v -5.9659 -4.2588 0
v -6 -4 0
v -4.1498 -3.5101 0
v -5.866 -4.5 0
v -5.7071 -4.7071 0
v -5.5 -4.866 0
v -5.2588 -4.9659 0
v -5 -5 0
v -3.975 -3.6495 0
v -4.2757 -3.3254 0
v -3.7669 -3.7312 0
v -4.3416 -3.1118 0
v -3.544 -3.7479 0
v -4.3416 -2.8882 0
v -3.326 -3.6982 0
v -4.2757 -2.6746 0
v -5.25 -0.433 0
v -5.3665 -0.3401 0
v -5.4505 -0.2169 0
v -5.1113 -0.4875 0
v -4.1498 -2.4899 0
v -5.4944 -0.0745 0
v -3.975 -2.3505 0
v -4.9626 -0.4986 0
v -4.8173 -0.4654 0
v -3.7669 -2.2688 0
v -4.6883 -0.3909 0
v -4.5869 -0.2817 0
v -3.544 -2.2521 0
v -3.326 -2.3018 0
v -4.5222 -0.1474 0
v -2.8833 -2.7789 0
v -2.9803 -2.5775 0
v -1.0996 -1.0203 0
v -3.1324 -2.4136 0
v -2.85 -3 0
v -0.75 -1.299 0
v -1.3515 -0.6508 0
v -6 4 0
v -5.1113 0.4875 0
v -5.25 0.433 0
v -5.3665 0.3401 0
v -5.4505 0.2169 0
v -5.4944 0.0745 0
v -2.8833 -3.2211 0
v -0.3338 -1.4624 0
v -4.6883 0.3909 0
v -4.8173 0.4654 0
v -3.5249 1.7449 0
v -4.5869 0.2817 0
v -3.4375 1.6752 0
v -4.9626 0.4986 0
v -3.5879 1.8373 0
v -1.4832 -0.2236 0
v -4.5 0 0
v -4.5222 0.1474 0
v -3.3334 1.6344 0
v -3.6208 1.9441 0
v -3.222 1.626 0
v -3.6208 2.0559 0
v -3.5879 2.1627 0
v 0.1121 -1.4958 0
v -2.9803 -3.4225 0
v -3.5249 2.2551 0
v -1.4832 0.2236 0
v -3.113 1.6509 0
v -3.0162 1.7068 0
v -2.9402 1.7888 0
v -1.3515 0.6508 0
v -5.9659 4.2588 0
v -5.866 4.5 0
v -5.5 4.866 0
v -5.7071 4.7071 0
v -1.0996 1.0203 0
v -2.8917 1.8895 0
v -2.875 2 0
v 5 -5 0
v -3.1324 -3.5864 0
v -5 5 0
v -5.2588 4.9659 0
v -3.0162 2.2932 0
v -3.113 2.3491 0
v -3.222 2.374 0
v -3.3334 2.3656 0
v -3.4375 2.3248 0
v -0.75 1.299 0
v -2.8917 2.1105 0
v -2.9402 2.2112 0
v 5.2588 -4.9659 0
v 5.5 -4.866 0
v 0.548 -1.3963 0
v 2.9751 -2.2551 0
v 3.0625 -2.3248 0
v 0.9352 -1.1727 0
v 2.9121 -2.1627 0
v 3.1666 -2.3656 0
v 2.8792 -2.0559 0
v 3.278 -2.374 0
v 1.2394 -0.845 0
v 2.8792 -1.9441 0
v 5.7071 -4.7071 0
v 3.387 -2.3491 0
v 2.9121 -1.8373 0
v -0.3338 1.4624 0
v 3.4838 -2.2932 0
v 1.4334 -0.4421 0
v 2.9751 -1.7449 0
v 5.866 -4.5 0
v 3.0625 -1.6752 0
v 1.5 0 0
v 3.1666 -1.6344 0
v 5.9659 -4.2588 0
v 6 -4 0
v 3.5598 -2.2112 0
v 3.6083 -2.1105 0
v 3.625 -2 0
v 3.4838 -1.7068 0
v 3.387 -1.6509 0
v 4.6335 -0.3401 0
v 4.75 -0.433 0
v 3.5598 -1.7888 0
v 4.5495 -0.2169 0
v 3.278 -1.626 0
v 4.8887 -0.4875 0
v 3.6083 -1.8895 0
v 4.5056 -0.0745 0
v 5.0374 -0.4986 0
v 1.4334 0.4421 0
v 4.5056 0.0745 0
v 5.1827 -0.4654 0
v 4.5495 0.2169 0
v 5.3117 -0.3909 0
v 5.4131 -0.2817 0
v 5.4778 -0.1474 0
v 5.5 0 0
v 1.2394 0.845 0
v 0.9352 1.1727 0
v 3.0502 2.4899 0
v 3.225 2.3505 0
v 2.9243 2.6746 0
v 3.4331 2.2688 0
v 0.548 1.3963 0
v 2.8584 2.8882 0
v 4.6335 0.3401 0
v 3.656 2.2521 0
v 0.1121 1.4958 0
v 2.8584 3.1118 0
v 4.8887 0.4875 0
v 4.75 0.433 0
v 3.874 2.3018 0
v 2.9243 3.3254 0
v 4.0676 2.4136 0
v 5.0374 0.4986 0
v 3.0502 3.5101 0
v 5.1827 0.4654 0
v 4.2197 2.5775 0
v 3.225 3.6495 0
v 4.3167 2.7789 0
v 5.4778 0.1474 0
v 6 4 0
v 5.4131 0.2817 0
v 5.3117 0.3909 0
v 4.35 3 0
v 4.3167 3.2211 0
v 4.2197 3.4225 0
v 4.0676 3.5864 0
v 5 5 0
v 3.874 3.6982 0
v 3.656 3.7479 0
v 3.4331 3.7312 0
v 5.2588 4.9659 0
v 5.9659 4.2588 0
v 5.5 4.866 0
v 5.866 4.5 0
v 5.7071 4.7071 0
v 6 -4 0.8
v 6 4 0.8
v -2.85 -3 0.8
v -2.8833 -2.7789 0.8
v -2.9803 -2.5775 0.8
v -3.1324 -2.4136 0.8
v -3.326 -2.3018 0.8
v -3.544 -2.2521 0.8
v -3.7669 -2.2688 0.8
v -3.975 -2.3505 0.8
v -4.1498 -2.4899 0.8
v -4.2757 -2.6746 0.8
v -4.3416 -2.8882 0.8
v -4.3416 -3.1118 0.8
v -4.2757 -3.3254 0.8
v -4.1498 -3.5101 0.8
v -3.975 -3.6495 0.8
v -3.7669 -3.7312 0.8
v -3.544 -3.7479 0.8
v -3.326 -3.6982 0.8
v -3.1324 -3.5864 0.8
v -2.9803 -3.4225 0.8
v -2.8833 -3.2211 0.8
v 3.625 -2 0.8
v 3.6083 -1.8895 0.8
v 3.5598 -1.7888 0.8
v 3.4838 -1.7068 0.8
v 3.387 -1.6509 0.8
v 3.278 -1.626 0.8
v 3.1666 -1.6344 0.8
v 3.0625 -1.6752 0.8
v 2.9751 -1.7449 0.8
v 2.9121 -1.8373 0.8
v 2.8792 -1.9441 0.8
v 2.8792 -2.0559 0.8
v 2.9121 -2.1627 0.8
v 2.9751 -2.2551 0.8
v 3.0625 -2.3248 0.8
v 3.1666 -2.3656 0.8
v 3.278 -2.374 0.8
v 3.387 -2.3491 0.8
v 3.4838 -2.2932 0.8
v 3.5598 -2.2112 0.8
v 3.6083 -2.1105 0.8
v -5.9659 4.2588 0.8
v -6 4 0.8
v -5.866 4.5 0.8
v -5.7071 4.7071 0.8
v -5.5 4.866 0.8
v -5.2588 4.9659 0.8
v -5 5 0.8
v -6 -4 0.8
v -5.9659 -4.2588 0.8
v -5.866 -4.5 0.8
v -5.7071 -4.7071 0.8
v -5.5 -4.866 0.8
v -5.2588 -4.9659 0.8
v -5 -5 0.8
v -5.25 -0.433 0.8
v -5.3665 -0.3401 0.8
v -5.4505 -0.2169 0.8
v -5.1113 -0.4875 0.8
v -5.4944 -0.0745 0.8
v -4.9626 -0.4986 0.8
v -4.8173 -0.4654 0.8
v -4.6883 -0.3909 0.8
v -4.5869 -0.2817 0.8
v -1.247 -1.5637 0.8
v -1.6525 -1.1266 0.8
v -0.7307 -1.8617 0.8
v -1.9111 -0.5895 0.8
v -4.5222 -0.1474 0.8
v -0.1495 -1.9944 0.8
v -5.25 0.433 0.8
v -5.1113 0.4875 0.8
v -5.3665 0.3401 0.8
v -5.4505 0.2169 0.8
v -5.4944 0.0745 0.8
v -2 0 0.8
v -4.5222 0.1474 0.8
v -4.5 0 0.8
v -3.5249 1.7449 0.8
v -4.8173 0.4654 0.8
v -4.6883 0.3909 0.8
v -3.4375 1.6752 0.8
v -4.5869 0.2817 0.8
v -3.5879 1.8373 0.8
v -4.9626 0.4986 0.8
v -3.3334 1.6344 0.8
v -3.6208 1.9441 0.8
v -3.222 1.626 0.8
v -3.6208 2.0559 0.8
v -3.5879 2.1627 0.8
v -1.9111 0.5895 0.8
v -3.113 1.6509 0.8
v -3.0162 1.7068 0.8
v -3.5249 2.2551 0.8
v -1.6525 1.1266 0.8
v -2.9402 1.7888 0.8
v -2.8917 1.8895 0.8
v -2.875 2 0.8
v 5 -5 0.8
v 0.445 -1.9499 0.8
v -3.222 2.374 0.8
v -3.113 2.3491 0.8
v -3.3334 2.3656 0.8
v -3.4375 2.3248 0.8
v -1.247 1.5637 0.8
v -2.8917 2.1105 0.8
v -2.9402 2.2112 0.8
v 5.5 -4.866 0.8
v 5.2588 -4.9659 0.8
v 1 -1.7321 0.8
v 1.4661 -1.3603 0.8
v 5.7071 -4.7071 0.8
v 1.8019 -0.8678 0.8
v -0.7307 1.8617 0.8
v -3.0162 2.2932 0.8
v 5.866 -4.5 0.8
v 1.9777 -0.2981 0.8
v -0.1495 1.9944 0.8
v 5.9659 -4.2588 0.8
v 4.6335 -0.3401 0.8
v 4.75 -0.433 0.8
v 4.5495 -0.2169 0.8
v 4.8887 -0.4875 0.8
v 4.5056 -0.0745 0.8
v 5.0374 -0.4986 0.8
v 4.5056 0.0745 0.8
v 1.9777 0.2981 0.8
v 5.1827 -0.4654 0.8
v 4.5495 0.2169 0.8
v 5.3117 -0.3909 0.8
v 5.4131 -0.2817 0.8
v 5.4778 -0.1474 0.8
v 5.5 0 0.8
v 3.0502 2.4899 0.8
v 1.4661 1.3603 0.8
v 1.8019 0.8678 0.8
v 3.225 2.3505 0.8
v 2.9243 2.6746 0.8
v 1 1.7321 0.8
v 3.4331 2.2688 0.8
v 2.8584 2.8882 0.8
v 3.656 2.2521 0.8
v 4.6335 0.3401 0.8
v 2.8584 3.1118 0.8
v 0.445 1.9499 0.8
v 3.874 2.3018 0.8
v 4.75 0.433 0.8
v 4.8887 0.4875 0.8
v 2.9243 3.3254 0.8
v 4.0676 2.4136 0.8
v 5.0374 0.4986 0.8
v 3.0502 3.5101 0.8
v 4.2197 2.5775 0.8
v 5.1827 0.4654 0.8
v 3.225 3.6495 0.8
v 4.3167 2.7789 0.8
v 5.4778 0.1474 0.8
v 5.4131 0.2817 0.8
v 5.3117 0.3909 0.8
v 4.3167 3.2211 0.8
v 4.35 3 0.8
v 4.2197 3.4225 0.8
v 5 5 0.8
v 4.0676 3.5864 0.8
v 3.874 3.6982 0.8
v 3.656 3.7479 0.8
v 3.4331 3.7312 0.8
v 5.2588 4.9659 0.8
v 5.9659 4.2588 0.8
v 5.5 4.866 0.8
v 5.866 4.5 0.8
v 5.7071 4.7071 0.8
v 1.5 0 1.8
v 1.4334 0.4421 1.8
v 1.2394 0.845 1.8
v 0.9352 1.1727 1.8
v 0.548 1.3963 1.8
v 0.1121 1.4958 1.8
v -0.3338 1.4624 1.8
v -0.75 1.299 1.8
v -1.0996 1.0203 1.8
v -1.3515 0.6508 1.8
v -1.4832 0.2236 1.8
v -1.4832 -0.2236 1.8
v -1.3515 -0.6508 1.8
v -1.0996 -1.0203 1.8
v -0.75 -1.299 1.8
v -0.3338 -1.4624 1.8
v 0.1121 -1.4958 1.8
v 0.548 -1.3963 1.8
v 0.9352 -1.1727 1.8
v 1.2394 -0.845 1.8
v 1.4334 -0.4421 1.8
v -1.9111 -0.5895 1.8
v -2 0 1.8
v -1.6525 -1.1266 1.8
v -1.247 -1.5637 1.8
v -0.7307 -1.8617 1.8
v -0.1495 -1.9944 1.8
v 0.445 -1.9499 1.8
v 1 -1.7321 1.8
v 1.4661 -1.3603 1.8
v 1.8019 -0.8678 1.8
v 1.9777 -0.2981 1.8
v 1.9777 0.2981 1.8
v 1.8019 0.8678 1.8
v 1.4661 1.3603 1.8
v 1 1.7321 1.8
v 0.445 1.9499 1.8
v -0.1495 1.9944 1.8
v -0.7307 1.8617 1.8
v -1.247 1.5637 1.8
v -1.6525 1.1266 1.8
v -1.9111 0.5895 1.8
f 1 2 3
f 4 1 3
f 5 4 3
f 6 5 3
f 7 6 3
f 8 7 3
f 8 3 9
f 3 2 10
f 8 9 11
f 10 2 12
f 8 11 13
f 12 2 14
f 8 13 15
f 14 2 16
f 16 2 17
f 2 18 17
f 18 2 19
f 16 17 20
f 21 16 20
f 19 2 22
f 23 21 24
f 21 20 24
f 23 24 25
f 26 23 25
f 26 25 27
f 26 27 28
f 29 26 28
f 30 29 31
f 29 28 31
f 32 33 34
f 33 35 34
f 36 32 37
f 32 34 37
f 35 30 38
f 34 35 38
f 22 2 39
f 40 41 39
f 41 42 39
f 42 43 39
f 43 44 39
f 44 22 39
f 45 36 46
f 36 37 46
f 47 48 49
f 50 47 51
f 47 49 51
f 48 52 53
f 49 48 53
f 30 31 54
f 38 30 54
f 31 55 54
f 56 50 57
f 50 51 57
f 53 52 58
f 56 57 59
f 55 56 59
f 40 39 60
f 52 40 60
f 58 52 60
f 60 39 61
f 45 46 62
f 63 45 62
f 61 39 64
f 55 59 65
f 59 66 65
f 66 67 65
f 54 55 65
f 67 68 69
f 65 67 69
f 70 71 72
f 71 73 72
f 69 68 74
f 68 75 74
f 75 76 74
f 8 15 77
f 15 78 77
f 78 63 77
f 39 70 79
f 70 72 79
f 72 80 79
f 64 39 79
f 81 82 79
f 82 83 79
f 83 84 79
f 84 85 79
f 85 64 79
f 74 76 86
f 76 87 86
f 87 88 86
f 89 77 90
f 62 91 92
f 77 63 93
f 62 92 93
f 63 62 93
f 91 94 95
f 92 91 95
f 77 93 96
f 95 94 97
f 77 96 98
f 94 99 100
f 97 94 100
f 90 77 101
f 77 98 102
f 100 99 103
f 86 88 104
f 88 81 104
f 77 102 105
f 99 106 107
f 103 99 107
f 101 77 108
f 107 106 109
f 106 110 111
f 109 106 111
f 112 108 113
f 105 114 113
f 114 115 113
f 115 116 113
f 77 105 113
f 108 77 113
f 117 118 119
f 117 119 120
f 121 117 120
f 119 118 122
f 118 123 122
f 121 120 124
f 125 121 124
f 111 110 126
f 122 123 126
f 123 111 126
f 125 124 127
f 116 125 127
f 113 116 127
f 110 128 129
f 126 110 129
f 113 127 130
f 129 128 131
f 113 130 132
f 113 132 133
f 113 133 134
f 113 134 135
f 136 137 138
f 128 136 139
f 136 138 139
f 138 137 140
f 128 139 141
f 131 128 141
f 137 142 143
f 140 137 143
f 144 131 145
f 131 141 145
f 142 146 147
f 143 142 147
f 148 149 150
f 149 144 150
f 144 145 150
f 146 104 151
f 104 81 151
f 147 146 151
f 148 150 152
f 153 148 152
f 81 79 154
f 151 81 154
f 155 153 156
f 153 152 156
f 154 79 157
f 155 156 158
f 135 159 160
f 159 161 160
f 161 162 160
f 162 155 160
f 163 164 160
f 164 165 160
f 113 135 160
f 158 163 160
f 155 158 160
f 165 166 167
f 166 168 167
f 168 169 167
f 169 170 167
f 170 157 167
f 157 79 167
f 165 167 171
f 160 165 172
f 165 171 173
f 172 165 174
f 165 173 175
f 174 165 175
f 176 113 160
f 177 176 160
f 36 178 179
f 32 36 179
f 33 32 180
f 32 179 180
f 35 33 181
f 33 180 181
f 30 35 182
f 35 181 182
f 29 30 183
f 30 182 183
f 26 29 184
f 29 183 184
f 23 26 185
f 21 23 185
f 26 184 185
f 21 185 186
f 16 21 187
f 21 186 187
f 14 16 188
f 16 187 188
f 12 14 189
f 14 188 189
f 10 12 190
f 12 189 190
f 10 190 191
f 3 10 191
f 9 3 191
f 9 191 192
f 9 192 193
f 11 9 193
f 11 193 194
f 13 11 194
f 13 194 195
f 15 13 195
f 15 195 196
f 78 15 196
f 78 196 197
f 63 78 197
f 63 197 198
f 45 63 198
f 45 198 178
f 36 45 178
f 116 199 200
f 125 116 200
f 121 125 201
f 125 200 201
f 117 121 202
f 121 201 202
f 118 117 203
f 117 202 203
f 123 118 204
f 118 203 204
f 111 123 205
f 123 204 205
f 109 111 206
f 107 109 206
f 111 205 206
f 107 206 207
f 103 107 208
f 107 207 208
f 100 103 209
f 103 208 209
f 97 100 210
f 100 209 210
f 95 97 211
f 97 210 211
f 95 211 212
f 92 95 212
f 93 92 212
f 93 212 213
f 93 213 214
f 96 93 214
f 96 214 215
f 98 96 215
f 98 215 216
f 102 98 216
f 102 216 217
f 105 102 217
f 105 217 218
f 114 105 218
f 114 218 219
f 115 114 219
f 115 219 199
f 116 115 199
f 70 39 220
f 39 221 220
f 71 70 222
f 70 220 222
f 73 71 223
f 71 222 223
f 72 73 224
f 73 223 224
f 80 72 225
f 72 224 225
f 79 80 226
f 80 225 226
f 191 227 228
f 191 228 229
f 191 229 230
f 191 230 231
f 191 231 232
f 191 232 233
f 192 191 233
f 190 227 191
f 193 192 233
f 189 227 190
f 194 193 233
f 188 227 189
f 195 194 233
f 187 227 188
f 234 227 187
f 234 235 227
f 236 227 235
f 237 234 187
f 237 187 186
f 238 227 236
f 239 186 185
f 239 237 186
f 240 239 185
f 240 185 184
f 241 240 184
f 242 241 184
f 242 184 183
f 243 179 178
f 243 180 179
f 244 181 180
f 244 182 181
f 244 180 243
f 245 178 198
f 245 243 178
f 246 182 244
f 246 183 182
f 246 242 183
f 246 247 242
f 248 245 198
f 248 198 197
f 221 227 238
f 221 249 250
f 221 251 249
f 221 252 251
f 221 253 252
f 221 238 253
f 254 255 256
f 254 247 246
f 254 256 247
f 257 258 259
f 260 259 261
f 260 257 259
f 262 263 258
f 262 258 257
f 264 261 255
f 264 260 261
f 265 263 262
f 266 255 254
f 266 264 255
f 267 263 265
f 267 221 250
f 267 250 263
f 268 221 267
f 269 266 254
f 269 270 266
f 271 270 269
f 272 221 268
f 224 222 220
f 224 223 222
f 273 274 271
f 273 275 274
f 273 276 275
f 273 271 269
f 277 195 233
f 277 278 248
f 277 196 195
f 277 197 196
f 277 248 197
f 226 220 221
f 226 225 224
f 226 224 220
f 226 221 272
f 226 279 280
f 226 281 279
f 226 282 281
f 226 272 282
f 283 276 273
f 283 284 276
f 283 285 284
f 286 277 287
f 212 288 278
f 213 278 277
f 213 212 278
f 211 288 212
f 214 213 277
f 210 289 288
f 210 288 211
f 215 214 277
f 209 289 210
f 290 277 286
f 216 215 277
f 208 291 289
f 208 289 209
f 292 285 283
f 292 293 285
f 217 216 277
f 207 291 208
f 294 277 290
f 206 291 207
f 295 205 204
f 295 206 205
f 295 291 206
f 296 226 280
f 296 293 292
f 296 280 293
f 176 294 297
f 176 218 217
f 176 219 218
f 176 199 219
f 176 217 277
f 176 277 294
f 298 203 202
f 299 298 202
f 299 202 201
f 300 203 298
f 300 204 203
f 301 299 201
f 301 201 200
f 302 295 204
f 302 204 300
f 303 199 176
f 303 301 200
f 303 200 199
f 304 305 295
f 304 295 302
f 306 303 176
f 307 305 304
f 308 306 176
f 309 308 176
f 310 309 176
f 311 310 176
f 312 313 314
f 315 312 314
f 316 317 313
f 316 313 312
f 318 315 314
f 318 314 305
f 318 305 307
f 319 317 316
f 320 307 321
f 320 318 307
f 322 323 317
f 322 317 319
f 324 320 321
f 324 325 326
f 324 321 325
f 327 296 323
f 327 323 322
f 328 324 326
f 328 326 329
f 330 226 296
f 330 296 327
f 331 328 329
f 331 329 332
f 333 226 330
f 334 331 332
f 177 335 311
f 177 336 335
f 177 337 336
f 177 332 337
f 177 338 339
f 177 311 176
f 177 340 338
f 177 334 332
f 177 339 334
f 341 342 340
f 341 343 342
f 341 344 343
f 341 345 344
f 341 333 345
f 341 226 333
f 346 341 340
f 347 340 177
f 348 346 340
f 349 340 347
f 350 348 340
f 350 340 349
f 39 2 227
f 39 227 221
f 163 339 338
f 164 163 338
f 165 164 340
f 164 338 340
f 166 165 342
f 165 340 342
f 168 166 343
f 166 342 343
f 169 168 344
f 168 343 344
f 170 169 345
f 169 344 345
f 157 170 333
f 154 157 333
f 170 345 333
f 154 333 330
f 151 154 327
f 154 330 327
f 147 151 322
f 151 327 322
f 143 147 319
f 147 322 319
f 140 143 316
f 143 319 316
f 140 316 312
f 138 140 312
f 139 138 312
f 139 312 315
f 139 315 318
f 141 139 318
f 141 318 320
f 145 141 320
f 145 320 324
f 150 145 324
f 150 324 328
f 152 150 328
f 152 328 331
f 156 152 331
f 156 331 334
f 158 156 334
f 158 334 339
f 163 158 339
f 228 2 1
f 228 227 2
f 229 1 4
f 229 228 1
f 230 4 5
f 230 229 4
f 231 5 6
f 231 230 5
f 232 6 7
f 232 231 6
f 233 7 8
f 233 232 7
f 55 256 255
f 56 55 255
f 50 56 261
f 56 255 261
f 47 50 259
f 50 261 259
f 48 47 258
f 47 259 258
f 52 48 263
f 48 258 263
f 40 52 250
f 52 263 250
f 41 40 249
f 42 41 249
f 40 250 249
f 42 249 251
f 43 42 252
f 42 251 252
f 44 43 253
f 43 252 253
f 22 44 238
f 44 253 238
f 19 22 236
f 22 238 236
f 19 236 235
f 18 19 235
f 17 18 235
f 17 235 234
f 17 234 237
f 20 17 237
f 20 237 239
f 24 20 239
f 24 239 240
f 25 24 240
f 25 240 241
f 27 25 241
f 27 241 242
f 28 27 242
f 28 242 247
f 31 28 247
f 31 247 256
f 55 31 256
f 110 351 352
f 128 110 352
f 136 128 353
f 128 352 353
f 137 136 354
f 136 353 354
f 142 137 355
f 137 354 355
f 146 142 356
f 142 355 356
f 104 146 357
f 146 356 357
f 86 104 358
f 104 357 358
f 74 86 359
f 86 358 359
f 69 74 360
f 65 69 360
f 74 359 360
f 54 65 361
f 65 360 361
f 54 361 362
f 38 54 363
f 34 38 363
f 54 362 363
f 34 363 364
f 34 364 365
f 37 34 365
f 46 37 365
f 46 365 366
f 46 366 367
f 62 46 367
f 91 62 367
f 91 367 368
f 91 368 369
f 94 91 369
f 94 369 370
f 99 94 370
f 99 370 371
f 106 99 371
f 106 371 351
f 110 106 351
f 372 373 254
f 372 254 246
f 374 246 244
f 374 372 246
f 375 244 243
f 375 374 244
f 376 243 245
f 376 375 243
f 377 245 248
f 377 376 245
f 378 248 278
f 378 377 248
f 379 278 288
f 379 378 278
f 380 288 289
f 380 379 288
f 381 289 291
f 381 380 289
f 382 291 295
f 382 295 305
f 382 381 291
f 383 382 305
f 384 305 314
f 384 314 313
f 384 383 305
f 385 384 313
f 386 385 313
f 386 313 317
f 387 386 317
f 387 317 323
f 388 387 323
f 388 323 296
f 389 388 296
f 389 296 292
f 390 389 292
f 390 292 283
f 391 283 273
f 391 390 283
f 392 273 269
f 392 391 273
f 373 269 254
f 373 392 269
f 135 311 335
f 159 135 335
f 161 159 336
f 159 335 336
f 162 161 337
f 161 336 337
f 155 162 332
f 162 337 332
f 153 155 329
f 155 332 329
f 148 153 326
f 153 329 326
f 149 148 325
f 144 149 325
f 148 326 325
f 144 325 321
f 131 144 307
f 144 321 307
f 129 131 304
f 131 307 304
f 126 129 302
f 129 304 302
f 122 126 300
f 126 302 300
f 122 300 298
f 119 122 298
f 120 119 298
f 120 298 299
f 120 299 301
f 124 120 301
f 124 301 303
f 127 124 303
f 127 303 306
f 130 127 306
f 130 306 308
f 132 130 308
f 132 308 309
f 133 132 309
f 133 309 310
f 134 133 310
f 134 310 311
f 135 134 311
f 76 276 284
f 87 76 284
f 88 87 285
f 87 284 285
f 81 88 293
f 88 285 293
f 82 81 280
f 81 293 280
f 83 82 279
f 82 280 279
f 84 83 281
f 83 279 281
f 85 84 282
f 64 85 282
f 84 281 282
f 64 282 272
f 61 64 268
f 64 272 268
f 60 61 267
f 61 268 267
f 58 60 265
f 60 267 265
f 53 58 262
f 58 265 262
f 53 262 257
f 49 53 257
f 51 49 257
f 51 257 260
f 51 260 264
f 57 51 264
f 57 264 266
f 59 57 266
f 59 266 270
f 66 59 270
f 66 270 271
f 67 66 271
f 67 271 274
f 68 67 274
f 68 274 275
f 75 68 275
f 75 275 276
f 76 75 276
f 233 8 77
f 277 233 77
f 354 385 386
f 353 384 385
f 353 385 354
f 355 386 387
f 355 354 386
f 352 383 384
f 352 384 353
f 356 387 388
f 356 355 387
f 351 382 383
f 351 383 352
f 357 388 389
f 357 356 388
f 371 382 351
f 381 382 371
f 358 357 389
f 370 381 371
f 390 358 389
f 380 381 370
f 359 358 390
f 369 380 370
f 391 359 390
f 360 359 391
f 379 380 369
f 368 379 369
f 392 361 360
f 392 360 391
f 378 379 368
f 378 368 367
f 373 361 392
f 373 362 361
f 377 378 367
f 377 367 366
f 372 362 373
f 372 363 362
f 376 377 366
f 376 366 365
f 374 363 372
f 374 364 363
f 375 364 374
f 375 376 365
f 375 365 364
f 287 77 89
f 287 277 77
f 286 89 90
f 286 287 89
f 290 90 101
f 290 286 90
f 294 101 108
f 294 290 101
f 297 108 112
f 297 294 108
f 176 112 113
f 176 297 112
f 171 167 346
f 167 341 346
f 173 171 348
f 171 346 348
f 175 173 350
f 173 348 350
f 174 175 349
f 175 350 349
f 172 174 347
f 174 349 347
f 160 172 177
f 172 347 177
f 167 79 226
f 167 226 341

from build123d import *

# Parameters (mm, degrees)
SKETCH_1_W          = 12
SKETCH_1_H          = 10
EXTRUDE_1_DEPTH     = 0.8
CUT_EXTRUDE_1_REACH = 9.851
SKETCH_2_R          = 1.5
SKETCH_2_R_2        = 0.75
SKETCH_2_R_3        = 0.375
FILLET_1_R          = 1
SKETCH_5_R          = 0.5
CUT_EXTRUDE_2_DEPTH = 8.851114571
EXTRUDE_START       = 1
SKETCH_14_R         = 2
SKETCH_14_R_2       = 1.5
EXTRUDE_2_DEPTH     = 1


with BuildPart() as part:
    # Эскиз1 → Бобышка-Вытянуть1 (new body)
    with BuildSketch(Plane.XY):
        Rectangle(SKETCH_1_W, SKETCH_1_H)
    extrude(amount=EXTRUDE_1_DEPTH)

    # Эскиз2 → Вырез-Вытянуть1 (cut, up to next)
    with BuildSketch(Plane.XY.offset(0.8), mode=Mode.PRIVATE) as cut_extrude_1_sk1:
        Circle(SKETCH_2_R)
    cut_extrude_1_tool1 = extrude(cut_extrude_1_sk1.sketch, amount=-CUT_EXTRUDE_1_REACH, mode=Mode.PRIVATE) & part.part
    # Эскиз2 → Вырез-Вытянуть1 (cut, up to next)
    with BuildSketch(Plane.XY.offset(0.8), mode=Mode.PRIVATE) as cut_extrude_1_sk2:
        with Locations((-3.6, -3)):
            Circle(SKETCH_2_R_2)
    cut_extrude_1_tool2 = extrude(cut_extrude_1_sk2.sketch, amount=-CUT_EXTRUDE_1_REACH, mode=Mode.PRIVATE) & part.part
    # Эскиз2 → Вырез-Вытянуть1 (cut, up to next)
    with BuildSketch(Plane.XY.offset(0.8), mode=Mode.PRIVATE) as cut_extrude_1_sk3:
        with Locations((3.6, 3)):
            Circle(SKETCH_2_R_2)
    cut_extrude_1_tool3 = extrude(cut_extrude_1_sk3.sketch, amount=-CUT_EXTRUDE_1_REACH, mode=Mode.PRIVATE) & part.part
    # Эскиз2 → Вырез-Вытянуть1 (cut, up to next)
    with BuildSketch(Plane.XY.offset(0.8), mode=Mode.PRIVATE) as cut_extrude_1_sk4:
        with Locations((3.25, -2)):
            Circle(SKETCH_2_R_3)
    cut_extrude_1_tool4 = extrude(cut_extrude_1_sk4.sketch, amount=-CUT_EXTRUDE_1_REACH, mode=Mode.PRIVATE) & part.part
    # Эскиз2 → Вырез-Вытянуть1 (cut, up to next)
    with BuildSketch(Plane.XY.offset(0.8), mode=Mode.PRIVATE) as cut_extrude_1_sk5:
        with Locations((-3.25, 2)):
            Circle(SKETCH_2_R_3)
    cut_extrude_1_tool5 = extrude(cut_extrude_1_sk5.sketch, amount=-CUT_EXTRUDE_1_REACH, mode=Mode.PRIVATE) & part.part
    add(cut_extrude_1_tool1.solids().sort_by_distance((0, 0, 0.8))[0], mode=Mode.SUBTRACT)
    add(cut_extrude_1_tool2.solids().sort_by_distance((-3.6, -3, 0.8))[0], mode=Mode.SUBTRACT)
    add(cut_extrude_1_tool3.solids().sort_by_distance((3.6, 3, 0.8))[0], mode=Mode.SUBTRACT)
    add(cut_extrude_1_tool4.solids().sort_by_distance((3.25, -2, 0.8))[0], mode=Mode.SUBTRACT)
    add(cut_extrude_1_tool5.solids().sort_by_distance((-3.25, 2, 0.8))[0], mode=Mode.SUBTRACT)

    # Скругление1
    fillet_1_edges = [part.edges().sort_by_distance(p)[0] for p in [
        (6, -5, 0.4),
        (-6, -5, 0.4),
        (-6, 5, 0.4),
        (6, 5, 0.4),
    ]]
    fillet(fillet_1_edges, radius=FILLET_1_R)

    # Эскиз5 → Вырез-Вытянуть2 (cut, through all)
    with BuildSketch(Plane.XY.offset(0.8)):
        with Locations((5, 0)):
            Circle(SKETCH_5_R)
        with Locations((-5, 0)):
            Circle(SKETCH_5_R)
    extrude(amount=-CUT_EXTRUDE_2_DEPTH, mode=Mode.SUBTRACT)

    # Эскиз14 → Бобышка-Вытянуть2 (add)
    with BuildSketch(Plane.XY.offset(0.8).offset(EXTRUDE_START)):
        with Locations(Location((0, 0, 0), (0, 0, 180))):
            Circle(SKETCH_14_R)
        Circle(SKETCH_14_R_2, mode=Mode.SUBTRACT)
    extrude(amount=-EXTRUDE_2_DEPTH)


solid = part.part
